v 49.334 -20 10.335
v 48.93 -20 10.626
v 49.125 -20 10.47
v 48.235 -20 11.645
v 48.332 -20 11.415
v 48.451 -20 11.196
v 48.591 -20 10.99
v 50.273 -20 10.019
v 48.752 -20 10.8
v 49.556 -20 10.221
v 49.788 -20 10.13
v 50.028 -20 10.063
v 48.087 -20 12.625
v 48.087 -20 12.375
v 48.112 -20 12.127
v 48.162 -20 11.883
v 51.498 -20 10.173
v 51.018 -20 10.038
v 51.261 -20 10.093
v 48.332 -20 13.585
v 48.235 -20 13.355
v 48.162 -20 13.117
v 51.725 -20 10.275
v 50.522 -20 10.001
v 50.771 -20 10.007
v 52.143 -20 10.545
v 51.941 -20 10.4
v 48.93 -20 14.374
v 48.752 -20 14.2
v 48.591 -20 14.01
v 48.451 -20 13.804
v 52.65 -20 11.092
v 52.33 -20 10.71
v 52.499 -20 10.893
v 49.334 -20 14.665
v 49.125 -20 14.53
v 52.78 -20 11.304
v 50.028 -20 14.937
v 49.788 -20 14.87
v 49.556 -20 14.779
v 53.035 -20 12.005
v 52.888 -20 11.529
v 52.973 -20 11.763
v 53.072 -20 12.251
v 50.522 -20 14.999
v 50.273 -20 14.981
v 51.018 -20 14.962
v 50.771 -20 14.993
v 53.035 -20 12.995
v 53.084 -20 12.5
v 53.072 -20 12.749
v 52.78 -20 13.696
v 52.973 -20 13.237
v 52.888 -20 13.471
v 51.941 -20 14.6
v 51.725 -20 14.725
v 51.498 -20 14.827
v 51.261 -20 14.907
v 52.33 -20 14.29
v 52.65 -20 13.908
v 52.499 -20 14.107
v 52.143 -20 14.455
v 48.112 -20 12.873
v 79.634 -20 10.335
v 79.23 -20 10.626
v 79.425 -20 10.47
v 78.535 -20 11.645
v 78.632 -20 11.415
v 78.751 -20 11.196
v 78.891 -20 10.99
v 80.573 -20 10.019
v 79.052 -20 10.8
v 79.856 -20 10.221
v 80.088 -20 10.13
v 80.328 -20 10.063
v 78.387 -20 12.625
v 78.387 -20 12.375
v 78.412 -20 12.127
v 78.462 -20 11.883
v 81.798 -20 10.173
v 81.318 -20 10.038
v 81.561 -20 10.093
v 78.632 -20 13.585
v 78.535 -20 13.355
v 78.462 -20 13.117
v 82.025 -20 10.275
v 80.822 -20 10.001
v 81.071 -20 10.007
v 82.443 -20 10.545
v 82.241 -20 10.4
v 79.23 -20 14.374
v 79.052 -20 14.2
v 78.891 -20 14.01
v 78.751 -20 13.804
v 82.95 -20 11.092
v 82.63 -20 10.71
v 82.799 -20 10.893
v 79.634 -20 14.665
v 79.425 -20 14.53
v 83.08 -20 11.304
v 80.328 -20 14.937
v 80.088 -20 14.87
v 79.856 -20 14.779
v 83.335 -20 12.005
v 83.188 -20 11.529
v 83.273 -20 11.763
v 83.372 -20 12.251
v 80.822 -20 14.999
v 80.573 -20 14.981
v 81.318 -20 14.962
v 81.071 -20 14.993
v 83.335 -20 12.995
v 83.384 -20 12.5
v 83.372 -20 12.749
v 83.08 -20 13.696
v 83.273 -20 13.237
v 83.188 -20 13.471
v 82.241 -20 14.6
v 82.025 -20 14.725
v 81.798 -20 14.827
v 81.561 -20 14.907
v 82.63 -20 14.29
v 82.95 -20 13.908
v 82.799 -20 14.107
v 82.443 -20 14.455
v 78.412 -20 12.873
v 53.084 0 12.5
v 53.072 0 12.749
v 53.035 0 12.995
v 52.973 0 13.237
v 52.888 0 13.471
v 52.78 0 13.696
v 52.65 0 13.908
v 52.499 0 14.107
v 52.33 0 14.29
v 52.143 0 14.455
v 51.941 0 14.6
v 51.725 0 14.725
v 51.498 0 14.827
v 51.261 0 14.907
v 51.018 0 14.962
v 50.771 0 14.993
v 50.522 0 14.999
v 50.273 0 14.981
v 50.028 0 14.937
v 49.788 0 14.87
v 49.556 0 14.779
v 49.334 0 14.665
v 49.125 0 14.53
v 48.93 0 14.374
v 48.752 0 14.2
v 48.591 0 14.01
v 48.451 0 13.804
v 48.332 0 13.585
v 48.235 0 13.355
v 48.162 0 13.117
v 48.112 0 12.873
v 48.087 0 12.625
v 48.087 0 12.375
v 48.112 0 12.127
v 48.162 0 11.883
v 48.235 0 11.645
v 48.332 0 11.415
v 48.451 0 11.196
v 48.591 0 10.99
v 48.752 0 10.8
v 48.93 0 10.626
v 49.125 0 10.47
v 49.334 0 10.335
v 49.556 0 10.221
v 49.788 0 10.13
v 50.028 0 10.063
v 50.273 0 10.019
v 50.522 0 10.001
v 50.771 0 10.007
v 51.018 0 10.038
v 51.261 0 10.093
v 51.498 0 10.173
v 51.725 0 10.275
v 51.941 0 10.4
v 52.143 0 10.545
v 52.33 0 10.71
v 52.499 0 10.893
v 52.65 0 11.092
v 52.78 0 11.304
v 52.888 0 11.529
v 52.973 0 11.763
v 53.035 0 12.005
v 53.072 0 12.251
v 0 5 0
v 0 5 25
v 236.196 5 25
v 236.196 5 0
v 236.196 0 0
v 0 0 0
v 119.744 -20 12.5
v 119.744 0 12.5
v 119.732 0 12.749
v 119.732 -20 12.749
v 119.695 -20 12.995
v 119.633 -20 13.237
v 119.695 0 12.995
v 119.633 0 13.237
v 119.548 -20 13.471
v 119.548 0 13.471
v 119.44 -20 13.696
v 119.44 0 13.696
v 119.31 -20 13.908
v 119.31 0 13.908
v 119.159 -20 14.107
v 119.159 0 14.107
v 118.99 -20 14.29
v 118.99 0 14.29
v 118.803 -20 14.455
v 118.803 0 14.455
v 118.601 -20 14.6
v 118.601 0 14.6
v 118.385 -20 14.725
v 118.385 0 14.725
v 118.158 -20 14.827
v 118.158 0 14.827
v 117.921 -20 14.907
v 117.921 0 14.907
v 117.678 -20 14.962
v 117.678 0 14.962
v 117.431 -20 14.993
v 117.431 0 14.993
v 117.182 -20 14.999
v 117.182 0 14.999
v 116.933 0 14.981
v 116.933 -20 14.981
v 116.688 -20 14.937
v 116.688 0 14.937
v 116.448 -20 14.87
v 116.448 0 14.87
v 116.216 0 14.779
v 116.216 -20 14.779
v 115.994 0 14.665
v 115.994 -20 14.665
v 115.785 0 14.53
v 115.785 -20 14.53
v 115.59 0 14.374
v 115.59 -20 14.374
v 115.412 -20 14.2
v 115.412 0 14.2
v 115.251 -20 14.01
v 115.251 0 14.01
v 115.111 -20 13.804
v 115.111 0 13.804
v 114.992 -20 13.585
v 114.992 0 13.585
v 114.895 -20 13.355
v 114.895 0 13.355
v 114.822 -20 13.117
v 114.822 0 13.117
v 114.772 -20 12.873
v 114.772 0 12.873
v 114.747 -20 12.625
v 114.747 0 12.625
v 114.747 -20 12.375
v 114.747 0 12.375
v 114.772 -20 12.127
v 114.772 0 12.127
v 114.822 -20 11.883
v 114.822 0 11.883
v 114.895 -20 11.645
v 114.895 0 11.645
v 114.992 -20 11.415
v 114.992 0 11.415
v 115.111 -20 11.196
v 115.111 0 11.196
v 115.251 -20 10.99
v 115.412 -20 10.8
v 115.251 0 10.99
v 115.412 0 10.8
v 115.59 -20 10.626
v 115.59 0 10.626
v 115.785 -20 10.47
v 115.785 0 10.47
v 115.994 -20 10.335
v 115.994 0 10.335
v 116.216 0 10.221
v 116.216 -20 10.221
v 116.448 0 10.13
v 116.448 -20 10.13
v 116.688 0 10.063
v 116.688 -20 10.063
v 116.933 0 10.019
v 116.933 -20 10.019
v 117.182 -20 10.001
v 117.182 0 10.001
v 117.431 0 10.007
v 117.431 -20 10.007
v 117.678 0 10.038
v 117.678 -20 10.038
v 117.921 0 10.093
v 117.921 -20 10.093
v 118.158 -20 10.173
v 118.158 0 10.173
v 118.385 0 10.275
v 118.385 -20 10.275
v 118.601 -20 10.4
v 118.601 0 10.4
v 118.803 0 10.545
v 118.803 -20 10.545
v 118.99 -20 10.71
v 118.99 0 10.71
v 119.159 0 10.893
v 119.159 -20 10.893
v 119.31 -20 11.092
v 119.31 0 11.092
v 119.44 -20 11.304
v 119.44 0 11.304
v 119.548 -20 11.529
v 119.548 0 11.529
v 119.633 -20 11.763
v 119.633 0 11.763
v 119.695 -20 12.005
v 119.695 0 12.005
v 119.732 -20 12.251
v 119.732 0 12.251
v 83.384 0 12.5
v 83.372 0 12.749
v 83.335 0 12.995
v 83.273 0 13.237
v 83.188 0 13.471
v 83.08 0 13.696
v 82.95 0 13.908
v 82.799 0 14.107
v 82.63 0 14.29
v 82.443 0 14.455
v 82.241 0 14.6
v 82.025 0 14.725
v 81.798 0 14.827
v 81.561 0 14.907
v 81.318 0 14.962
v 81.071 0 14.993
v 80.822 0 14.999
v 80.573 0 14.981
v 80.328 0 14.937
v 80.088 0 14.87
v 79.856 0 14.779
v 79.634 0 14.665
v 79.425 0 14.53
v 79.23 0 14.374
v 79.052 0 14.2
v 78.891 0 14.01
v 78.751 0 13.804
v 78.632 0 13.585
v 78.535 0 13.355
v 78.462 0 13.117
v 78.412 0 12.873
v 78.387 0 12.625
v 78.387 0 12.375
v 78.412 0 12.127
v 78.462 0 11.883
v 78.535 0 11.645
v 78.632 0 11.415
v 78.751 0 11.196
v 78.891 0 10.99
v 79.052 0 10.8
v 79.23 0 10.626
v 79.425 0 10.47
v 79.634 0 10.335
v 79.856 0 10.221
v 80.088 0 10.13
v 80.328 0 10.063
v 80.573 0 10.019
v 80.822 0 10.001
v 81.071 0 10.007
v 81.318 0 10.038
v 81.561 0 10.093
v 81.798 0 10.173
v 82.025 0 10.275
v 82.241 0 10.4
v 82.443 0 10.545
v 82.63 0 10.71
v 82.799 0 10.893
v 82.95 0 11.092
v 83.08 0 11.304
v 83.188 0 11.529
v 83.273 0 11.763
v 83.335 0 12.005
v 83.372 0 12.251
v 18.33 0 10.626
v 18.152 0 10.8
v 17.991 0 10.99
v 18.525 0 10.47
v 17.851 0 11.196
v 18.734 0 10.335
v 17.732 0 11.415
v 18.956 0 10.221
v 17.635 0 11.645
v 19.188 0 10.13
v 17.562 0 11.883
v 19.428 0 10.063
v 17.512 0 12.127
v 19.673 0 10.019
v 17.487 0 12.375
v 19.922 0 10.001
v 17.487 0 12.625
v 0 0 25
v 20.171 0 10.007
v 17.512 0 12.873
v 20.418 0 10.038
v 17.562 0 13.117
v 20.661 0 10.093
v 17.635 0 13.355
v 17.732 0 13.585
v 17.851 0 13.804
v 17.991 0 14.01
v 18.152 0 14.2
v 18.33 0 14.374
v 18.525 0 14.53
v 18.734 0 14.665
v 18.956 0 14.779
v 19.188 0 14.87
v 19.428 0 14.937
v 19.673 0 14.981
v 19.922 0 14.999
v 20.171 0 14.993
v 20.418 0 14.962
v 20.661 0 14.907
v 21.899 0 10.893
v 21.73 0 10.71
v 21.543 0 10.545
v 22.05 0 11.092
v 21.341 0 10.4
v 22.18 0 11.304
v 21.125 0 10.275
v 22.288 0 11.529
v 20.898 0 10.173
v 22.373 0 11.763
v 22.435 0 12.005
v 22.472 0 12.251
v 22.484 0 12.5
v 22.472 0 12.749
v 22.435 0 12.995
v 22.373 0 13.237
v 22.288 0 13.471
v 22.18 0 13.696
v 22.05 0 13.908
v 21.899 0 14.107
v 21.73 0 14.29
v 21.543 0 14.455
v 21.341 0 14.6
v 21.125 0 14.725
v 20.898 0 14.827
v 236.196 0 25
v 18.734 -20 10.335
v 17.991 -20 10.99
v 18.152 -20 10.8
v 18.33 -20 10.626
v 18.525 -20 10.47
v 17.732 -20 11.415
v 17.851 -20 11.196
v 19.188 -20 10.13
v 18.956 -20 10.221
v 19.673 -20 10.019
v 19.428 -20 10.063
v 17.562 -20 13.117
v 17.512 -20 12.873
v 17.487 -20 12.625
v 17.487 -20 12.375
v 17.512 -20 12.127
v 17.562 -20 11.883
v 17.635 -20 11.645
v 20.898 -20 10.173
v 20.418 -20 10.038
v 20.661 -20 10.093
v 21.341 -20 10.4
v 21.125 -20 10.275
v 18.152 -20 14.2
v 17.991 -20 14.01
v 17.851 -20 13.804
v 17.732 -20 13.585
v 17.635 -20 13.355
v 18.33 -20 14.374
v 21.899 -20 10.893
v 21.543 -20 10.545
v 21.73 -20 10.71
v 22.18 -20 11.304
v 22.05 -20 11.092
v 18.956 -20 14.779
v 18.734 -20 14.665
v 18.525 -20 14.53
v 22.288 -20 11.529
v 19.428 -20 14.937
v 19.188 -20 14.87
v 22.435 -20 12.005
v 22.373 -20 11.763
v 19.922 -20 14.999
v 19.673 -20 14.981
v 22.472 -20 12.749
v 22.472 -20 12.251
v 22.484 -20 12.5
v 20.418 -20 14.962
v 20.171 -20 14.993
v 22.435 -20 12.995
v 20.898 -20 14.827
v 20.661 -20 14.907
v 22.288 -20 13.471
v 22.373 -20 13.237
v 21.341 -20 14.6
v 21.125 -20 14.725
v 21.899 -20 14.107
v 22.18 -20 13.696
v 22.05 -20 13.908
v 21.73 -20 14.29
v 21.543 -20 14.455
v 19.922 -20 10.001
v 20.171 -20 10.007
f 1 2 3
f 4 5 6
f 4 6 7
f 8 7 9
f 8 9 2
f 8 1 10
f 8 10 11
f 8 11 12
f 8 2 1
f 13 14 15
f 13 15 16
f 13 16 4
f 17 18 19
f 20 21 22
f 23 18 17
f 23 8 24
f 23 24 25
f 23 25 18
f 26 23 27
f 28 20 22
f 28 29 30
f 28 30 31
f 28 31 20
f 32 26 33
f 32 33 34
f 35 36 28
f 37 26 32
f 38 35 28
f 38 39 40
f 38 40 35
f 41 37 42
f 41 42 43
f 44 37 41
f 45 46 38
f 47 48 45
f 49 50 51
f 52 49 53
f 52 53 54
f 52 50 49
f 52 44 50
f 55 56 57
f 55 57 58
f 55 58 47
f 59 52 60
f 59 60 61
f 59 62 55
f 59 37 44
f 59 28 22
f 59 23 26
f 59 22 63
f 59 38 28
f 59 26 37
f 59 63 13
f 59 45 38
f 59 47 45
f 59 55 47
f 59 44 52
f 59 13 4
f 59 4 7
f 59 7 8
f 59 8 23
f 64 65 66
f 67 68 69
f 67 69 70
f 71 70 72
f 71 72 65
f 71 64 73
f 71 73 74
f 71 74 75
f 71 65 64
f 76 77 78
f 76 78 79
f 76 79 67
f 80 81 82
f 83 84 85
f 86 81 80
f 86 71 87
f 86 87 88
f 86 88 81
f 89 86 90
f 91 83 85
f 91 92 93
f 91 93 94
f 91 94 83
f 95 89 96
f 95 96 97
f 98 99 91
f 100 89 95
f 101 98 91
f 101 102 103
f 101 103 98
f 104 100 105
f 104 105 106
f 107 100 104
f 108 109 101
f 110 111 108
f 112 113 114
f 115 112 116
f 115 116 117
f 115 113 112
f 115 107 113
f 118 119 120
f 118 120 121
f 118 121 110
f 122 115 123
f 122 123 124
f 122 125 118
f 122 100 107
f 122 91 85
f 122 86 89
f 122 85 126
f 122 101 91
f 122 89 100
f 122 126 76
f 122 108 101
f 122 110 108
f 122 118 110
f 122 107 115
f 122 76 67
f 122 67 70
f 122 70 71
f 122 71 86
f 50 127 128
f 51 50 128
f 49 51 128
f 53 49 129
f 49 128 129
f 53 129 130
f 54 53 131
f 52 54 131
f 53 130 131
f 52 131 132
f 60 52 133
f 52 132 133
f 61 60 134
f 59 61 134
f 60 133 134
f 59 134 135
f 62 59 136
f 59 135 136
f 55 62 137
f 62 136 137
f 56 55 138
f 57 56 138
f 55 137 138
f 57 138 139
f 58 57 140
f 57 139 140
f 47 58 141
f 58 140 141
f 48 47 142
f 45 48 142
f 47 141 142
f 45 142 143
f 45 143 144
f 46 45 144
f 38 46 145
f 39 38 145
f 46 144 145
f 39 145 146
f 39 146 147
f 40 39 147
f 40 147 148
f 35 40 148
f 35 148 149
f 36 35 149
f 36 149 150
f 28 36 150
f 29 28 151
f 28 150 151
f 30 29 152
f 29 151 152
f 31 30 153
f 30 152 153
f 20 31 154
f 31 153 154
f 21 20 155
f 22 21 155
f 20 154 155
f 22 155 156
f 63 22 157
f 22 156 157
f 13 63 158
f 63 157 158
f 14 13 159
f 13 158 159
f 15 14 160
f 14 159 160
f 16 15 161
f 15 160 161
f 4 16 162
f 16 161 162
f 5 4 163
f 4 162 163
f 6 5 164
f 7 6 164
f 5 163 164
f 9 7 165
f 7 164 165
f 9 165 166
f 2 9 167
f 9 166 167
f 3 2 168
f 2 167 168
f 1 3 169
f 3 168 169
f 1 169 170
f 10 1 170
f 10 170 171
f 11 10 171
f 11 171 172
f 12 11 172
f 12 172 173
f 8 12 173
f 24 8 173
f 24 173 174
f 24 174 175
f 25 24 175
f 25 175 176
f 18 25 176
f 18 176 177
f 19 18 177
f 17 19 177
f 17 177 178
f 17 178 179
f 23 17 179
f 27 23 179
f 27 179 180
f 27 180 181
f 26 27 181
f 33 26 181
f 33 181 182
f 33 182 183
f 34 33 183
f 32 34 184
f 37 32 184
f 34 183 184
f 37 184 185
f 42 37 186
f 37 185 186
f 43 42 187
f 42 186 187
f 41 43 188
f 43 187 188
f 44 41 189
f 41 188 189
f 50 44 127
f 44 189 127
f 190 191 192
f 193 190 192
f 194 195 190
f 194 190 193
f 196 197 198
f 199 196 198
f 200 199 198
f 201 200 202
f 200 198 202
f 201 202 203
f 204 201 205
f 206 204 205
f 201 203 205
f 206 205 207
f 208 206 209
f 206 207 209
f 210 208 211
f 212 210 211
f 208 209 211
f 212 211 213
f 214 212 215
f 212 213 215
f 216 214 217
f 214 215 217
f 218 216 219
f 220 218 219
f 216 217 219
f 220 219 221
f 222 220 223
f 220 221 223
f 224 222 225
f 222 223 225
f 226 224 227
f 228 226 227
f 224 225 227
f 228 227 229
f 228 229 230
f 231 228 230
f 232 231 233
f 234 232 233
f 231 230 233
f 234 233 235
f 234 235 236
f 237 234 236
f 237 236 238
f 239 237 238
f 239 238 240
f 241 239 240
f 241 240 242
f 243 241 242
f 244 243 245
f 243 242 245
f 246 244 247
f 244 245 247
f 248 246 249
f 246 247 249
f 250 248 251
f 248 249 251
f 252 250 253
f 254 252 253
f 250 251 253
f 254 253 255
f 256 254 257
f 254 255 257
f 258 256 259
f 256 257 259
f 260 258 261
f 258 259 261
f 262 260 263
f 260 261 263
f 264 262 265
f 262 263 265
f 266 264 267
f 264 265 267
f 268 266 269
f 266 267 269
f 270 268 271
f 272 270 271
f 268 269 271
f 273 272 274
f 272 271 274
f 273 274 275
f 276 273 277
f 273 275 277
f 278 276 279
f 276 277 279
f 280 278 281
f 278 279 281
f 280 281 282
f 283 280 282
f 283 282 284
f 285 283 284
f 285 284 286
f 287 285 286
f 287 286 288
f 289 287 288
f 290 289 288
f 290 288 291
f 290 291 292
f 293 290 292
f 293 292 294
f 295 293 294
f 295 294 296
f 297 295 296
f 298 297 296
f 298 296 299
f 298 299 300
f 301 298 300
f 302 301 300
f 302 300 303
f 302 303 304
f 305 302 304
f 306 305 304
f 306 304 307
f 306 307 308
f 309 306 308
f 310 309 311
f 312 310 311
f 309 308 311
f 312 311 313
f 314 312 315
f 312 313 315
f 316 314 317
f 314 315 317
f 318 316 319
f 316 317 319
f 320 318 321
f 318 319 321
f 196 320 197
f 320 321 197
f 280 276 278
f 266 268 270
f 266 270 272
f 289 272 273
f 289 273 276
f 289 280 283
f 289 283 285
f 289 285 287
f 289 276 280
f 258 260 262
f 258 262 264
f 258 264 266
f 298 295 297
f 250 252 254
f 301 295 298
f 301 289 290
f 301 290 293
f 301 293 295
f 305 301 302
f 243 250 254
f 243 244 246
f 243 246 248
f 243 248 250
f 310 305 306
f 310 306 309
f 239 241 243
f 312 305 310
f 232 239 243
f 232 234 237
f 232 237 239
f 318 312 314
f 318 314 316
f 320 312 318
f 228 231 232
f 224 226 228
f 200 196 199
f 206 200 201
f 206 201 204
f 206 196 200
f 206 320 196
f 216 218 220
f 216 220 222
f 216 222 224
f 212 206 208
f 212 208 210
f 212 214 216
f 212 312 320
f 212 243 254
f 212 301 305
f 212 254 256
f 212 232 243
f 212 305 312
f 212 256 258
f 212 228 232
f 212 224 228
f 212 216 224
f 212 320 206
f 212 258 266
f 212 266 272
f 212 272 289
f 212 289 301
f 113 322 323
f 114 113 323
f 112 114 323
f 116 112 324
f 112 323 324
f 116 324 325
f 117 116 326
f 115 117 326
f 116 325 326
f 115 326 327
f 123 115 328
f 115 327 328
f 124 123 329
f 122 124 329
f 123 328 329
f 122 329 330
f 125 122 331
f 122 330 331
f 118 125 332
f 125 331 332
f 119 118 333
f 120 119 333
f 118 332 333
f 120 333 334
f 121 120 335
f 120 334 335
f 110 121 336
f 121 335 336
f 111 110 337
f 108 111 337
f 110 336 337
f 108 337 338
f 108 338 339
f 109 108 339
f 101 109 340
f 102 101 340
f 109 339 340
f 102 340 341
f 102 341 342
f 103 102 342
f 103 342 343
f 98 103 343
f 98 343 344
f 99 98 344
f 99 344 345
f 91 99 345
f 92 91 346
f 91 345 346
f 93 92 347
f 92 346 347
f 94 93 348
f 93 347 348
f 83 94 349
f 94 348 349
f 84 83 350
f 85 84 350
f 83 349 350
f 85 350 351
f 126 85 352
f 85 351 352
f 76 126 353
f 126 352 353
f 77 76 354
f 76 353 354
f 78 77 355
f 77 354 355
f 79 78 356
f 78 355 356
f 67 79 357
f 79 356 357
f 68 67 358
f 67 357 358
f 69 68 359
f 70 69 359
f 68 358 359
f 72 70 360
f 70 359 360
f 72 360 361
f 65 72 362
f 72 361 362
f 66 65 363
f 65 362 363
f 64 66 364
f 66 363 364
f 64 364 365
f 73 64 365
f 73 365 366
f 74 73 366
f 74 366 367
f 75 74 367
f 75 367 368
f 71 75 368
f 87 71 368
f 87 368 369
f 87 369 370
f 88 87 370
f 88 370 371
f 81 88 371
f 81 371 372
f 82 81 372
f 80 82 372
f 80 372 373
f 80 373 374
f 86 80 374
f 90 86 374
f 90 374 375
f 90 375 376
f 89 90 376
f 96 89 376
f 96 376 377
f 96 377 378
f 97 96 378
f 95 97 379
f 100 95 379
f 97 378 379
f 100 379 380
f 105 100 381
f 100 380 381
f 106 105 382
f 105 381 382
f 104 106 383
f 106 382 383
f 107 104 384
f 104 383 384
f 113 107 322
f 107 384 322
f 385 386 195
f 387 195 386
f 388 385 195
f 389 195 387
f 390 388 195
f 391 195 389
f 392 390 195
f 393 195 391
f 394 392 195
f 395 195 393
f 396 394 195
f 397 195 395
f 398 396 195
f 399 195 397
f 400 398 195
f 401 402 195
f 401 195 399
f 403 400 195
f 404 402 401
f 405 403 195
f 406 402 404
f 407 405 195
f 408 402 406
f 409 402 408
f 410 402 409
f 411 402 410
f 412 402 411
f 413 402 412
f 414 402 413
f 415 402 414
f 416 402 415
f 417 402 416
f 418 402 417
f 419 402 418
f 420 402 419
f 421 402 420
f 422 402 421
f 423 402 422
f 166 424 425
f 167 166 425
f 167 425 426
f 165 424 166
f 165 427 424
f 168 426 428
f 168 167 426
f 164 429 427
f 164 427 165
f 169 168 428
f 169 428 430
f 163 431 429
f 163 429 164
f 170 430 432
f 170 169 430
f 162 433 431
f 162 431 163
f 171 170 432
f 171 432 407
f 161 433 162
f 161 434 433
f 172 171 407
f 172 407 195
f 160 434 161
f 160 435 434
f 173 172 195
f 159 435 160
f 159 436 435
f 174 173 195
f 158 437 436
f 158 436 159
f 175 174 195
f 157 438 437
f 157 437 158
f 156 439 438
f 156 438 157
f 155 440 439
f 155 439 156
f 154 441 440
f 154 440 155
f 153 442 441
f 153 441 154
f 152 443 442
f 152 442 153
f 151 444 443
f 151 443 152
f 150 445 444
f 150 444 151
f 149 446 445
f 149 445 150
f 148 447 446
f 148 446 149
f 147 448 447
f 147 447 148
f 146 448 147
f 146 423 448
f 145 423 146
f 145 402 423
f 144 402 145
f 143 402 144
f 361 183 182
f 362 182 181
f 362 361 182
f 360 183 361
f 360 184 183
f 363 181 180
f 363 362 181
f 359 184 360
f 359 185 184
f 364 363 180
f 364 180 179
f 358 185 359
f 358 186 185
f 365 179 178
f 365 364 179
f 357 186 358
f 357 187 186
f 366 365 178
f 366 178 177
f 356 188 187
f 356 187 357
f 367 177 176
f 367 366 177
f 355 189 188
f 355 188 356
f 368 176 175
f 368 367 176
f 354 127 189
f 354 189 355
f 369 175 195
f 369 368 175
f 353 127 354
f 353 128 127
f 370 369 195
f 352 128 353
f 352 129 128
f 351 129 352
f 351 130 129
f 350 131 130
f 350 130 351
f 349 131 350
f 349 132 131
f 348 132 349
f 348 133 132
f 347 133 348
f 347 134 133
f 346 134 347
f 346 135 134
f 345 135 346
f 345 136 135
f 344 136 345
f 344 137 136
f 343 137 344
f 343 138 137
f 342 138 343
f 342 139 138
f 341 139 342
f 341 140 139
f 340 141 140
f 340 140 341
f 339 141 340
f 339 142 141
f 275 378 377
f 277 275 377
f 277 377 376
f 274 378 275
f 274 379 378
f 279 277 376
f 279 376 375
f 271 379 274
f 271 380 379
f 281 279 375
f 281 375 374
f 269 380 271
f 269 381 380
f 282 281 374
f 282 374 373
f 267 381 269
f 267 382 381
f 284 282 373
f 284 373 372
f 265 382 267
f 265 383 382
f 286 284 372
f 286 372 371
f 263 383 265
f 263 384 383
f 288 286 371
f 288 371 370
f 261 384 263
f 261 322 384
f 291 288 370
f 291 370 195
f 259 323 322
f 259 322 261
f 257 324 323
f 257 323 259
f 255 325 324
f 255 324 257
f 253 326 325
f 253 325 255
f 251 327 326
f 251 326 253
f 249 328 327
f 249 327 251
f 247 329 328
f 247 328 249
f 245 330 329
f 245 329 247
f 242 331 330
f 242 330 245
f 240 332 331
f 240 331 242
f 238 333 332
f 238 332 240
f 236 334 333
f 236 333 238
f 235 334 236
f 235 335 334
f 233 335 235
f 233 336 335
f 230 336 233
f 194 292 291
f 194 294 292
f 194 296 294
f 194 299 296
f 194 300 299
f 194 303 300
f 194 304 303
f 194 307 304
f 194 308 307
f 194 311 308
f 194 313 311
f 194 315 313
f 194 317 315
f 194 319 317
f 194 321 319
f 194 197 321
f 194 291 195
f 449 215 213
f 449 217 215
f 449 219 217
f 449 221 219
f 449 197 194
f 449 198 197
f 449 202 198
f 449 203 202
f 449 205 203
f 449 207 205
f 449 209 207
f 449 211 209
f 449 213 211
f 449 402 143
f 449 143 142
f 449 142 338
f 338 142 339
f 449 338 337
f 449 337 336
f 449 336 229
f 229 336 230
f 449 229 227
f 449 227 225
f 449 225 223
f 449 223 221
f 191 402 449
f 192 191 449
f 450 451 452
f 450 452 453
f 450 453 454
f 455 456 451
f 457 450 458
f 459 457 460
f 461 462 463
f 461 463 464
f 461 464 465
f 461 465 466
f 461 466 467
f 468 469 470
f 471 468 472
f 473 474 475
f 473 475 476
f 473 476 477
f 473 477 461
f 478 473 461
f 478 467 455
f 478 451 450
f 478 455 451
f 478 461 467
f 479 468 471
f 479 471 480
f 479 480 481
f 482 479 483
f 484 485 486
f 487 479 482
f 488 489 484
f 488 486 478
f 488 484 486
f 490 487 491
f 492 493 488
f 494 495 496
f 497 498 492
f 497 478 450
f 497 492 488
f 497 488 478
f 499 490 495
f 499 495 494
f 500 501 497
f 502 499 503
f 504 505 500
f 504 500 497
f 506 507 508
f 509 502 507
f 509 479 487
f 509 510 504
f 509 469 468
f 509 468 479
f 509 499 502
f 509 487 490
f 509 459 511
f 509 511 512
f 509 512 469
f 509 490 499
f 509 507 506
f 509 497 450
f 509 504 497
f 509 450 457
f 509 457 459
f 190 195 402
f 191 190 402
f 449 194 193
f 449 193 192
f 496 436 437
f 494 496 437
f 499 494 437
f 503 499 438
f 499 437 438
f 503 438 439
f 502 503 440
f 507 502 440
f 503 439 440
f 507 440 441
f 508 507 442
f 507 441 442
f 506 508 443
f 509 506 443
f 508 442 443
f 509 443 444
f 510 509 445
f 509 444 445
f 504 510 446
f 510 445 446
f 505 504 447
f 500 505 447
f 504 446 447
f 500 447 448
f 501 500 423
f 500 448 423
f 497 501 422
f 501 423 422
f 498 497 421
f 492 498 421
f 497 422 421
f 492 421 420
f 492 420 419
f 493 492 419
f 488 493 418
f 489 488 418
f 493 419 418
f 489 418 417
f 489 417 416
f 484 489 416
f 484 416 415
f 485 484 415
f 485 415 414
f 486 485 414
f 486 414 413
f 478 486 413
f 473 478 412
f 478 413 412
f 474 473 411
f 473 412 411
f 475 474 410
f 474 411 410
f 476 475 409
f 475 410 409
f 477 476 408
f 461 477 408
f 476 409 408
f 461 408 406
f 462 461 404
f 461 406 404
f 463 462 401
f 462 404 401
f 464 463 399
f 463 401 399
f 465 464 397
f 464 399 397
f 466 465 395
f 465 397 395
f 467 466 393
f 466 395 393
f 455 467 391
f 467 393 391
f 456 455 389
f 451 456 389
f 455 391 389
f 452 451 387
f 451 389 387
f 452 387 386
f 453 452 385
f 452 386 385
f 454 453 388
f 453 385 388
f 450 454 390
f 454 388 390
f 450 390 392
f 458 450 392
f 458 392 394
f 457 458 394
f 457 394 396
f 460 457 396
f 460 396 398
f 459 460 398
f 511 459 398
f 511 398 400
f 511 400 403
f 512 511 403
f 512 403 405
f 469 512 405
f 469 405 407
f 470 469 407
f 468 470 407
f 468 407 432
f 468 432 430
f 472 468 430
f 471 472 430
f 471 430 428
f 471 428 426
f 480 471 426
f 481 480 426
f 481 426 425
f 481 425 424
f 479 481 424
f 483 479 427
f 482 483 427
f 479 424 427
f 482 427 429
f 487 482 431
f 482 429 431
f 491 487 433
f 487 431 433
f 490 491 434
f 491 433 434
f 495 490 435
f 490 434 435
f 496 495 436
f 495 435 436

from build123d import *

# Parameters (mm, degrees)
F0_W     = 236.196054
F0_H     = 25
F1_DEPTH = 5
F2_R     = 2.5
F3_DEPTH = 20


with BuildPart() as f1:
    # F0 (on Front) → F1 (new body)
    with BuildSketch(Plane.XZ):
        with Locations((118.098027, 12.5)):
            Rectangle(F0_W, F0_H)
    extrude(amount=-F1_DEPTH)

    # F2 (on face) → F3 (join)
    with BuildSketch(Plane.XZ):
        with Locations((19.984195, 12.5)):
            Circle(F2_R)
        with Locations((50.584195, 12.5)):
            Circle(F2_R)
        with Locations((80.884195, 12.5)):
            Circle(F2_R)
        with Locations((117.244195, 12.5)):
            Circle(F2_R)
    extrude(amount=F3_DEPTH)


solid = f1.part
